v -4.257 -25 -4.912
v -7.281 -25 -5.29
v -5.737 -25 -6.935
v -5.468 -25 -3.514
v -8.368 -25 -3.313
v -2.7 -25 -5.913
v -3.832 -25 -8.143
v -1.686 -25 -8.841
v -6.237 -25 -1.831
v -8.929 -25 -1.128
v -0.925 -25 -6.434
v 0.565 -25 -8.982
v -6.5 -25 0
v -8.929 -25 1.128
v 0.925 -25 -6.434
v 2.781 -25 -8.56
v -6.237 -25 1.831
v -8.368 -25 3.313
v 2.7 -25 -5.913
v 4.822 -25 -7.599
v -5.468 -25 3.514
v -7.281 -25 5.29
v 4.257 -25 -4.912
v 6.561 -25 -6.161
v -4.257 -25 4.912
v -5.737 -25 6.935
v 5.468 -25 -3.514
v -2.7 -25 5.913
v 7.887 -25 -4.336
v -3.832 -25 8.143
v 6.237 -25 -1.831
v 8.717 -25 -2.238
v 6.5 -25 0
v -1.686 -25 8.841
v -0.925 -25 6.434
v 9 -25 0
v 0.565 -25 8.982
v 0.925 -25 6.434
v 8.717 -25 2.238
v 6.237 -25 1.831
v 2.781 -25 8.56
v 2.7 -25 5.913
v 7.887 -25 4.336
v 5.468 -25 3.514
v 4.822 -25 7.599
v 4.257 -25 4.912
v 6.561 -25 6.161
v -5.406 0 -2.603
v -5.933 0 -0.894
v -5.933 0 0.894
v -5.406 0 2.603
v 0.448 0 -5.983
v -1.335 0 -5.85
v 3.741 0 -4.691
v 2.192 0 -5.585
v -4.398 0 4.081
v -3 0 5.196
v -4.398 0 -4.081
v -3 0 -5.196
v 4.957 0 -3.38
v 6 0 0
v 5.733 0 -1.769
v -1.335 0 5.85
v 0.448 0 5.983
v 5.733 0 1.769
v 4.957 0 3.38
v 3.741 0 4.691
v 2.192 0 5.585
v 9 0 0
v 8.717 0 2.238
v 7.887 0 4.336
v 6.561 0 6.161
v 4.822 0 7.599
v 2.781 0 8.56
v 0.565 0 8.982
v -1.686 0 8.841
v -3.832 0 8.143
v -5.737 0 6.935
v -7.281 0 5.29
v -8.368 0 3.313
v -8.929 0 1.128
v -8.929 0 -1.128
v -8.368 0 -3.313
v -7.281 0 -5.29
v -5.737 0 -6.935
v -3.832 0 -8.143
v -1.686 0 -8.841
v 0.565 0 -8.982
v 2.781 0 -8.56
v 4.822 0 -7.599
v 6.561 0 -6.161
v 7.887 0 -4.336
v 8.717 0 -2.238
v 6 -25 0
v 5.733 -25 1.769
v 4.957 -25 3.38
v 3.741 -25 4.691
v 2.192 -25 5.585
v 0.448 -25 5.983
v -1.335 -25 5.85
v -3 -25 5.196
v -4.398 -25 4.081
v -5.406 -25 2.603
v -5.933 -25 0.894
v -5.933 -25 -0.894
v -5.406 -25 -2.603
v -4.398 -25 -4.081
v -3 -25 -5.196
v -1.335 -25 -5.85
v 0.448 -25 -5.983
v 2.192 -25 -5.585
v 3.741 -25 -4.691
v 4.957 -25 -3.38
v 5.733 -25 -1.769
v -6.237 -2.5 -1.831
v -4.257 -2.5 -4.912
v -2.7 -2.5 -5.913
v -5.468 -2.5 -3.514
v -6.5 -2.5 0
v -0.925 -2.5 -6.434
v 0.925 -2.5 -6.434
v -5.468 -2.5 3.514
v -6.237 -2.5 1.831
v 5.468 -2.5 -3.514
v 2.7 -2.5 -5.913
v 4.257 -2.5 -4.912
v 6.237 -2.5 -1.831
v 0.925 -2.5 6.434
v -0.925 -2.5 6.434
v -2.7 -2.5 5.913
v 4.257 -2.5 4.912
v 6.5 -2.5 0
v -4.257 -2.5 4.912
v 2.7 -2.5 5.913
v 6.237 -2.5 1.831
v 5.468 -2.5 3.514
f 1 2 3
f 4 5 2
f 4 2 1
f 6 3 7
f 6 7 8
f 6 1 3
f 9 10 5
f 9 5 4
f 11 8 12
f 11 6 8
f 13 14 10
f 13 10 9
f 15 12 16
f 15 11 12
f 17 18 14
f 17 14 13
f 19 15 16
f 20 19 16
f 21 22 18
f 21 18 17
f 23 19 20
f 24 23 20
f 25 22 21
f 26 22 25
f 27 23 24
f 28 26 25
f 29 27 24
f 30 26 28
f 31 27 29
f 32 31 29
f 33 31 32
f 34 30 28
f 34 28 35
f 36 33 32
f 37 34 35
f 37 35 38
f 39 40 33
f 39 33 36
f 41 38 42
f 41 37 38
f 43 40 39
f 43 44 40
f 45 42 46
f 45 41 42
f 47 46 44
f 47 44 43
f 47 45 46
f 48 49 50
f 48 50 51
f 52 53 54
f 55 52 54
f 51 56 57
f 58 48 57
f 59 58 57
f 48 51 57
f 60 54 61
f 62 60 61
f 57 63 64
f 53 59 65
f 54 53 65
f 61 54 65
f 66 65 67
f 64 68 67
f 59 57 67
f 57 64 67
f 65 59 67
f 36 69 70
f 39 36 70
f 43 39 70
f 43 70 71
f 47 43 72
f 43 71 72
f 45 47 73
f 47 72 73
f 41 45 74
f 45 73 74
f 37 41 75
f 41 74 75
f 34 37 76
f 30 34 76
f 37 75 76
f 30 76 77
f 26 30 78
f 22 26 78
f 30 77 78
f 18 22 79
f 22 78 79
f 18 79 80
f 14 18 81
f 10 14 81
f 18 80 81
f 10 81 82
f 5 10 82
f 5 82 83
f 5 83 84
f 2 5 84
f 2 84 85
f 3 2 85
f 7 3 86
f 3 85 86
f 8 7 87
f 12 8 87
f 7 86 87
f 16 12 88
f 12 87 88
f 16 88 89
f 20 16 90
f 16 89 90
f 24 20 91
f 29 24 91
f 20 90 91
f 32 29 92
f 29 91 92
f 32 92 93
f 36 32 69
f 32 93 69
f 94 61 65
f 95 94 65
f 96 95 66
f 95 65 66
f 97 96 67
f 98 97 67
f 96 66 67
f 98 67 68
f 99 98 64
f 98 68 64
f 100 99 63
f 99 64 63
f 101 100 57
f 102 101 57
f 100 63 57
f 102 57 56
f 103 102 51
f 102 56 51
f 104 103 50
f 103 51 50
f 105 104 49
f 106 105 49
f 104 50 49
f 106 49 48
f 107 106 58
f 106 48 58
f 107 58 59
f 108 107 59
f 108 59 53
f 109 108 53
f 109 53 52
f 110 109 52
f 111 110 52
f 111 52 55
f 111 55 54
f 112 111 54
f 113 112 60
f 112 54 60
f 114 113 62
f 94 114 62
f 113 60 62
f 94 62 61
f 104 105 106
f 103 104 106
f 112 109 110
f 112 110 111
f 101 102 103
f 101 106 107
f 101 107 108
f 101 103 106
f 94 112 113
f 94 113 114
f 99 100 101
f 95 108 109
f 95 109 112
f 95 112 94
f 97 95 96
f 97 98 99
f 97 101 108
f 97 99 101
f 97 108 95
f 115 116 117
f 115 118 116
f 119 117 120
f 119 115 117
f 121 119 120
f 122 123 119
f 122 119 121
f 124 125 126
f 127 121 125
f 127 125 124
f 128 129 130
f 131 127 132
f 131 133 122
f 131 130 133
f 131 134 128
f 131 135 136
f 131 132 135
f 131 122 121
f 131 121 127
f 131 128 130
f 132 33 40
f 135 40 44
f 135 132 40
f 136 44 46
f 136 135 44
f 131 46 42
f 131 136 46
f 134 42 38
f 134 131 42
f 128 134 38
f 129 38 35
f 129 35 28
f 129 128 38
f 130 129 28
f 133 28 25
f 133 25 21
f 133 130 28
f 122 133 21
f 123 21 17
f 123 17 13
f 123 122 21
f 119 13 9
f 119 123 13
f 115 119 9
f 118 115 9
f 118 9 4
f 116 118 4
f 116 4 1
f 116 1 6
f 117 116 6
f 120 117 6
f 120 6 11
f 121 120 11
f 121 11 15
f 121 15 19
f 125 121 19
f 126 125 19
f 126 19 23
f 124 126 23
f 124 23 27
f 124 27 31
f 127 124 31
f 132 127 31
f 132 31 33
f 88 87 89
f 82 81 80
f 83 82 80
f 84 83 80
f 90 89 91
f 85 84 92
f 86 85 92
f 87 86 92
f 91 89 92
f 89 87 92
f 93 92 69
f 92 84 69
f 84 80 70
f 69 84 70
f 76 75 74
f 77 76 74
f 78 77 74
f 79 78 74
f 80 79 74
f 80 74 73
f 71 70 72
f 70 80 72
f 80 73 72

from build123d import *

# Parameters (mm, degrees)
F0_R     = 9
F2_DEPTH = 25
F1_R     = 6
F3_T     = -2.5


with BuildPart() as f2:
    # F0 (on Front) → F2 (new body)
    with BuildSketch(Plane.XZ):
        Circle(F0_R)
    extrude(amount=F2_DEPTH)

    # F3
    f3_openings = [f2.faces().sort_by_distance(p)[0] for p in [
        (0, -25, 0),
    ]]
    offset(amount=F3_T, openings=f3_openings)


with BuildPart() as f2b:
    # F1 (on face) → F2, piece 2 (new body)
    with BuildSketch(Plane.XZ):
        Circle(F1_R)
    extrude(amount=F2_DEPTH)


solid = Compound([f2.part, f2b.part])
